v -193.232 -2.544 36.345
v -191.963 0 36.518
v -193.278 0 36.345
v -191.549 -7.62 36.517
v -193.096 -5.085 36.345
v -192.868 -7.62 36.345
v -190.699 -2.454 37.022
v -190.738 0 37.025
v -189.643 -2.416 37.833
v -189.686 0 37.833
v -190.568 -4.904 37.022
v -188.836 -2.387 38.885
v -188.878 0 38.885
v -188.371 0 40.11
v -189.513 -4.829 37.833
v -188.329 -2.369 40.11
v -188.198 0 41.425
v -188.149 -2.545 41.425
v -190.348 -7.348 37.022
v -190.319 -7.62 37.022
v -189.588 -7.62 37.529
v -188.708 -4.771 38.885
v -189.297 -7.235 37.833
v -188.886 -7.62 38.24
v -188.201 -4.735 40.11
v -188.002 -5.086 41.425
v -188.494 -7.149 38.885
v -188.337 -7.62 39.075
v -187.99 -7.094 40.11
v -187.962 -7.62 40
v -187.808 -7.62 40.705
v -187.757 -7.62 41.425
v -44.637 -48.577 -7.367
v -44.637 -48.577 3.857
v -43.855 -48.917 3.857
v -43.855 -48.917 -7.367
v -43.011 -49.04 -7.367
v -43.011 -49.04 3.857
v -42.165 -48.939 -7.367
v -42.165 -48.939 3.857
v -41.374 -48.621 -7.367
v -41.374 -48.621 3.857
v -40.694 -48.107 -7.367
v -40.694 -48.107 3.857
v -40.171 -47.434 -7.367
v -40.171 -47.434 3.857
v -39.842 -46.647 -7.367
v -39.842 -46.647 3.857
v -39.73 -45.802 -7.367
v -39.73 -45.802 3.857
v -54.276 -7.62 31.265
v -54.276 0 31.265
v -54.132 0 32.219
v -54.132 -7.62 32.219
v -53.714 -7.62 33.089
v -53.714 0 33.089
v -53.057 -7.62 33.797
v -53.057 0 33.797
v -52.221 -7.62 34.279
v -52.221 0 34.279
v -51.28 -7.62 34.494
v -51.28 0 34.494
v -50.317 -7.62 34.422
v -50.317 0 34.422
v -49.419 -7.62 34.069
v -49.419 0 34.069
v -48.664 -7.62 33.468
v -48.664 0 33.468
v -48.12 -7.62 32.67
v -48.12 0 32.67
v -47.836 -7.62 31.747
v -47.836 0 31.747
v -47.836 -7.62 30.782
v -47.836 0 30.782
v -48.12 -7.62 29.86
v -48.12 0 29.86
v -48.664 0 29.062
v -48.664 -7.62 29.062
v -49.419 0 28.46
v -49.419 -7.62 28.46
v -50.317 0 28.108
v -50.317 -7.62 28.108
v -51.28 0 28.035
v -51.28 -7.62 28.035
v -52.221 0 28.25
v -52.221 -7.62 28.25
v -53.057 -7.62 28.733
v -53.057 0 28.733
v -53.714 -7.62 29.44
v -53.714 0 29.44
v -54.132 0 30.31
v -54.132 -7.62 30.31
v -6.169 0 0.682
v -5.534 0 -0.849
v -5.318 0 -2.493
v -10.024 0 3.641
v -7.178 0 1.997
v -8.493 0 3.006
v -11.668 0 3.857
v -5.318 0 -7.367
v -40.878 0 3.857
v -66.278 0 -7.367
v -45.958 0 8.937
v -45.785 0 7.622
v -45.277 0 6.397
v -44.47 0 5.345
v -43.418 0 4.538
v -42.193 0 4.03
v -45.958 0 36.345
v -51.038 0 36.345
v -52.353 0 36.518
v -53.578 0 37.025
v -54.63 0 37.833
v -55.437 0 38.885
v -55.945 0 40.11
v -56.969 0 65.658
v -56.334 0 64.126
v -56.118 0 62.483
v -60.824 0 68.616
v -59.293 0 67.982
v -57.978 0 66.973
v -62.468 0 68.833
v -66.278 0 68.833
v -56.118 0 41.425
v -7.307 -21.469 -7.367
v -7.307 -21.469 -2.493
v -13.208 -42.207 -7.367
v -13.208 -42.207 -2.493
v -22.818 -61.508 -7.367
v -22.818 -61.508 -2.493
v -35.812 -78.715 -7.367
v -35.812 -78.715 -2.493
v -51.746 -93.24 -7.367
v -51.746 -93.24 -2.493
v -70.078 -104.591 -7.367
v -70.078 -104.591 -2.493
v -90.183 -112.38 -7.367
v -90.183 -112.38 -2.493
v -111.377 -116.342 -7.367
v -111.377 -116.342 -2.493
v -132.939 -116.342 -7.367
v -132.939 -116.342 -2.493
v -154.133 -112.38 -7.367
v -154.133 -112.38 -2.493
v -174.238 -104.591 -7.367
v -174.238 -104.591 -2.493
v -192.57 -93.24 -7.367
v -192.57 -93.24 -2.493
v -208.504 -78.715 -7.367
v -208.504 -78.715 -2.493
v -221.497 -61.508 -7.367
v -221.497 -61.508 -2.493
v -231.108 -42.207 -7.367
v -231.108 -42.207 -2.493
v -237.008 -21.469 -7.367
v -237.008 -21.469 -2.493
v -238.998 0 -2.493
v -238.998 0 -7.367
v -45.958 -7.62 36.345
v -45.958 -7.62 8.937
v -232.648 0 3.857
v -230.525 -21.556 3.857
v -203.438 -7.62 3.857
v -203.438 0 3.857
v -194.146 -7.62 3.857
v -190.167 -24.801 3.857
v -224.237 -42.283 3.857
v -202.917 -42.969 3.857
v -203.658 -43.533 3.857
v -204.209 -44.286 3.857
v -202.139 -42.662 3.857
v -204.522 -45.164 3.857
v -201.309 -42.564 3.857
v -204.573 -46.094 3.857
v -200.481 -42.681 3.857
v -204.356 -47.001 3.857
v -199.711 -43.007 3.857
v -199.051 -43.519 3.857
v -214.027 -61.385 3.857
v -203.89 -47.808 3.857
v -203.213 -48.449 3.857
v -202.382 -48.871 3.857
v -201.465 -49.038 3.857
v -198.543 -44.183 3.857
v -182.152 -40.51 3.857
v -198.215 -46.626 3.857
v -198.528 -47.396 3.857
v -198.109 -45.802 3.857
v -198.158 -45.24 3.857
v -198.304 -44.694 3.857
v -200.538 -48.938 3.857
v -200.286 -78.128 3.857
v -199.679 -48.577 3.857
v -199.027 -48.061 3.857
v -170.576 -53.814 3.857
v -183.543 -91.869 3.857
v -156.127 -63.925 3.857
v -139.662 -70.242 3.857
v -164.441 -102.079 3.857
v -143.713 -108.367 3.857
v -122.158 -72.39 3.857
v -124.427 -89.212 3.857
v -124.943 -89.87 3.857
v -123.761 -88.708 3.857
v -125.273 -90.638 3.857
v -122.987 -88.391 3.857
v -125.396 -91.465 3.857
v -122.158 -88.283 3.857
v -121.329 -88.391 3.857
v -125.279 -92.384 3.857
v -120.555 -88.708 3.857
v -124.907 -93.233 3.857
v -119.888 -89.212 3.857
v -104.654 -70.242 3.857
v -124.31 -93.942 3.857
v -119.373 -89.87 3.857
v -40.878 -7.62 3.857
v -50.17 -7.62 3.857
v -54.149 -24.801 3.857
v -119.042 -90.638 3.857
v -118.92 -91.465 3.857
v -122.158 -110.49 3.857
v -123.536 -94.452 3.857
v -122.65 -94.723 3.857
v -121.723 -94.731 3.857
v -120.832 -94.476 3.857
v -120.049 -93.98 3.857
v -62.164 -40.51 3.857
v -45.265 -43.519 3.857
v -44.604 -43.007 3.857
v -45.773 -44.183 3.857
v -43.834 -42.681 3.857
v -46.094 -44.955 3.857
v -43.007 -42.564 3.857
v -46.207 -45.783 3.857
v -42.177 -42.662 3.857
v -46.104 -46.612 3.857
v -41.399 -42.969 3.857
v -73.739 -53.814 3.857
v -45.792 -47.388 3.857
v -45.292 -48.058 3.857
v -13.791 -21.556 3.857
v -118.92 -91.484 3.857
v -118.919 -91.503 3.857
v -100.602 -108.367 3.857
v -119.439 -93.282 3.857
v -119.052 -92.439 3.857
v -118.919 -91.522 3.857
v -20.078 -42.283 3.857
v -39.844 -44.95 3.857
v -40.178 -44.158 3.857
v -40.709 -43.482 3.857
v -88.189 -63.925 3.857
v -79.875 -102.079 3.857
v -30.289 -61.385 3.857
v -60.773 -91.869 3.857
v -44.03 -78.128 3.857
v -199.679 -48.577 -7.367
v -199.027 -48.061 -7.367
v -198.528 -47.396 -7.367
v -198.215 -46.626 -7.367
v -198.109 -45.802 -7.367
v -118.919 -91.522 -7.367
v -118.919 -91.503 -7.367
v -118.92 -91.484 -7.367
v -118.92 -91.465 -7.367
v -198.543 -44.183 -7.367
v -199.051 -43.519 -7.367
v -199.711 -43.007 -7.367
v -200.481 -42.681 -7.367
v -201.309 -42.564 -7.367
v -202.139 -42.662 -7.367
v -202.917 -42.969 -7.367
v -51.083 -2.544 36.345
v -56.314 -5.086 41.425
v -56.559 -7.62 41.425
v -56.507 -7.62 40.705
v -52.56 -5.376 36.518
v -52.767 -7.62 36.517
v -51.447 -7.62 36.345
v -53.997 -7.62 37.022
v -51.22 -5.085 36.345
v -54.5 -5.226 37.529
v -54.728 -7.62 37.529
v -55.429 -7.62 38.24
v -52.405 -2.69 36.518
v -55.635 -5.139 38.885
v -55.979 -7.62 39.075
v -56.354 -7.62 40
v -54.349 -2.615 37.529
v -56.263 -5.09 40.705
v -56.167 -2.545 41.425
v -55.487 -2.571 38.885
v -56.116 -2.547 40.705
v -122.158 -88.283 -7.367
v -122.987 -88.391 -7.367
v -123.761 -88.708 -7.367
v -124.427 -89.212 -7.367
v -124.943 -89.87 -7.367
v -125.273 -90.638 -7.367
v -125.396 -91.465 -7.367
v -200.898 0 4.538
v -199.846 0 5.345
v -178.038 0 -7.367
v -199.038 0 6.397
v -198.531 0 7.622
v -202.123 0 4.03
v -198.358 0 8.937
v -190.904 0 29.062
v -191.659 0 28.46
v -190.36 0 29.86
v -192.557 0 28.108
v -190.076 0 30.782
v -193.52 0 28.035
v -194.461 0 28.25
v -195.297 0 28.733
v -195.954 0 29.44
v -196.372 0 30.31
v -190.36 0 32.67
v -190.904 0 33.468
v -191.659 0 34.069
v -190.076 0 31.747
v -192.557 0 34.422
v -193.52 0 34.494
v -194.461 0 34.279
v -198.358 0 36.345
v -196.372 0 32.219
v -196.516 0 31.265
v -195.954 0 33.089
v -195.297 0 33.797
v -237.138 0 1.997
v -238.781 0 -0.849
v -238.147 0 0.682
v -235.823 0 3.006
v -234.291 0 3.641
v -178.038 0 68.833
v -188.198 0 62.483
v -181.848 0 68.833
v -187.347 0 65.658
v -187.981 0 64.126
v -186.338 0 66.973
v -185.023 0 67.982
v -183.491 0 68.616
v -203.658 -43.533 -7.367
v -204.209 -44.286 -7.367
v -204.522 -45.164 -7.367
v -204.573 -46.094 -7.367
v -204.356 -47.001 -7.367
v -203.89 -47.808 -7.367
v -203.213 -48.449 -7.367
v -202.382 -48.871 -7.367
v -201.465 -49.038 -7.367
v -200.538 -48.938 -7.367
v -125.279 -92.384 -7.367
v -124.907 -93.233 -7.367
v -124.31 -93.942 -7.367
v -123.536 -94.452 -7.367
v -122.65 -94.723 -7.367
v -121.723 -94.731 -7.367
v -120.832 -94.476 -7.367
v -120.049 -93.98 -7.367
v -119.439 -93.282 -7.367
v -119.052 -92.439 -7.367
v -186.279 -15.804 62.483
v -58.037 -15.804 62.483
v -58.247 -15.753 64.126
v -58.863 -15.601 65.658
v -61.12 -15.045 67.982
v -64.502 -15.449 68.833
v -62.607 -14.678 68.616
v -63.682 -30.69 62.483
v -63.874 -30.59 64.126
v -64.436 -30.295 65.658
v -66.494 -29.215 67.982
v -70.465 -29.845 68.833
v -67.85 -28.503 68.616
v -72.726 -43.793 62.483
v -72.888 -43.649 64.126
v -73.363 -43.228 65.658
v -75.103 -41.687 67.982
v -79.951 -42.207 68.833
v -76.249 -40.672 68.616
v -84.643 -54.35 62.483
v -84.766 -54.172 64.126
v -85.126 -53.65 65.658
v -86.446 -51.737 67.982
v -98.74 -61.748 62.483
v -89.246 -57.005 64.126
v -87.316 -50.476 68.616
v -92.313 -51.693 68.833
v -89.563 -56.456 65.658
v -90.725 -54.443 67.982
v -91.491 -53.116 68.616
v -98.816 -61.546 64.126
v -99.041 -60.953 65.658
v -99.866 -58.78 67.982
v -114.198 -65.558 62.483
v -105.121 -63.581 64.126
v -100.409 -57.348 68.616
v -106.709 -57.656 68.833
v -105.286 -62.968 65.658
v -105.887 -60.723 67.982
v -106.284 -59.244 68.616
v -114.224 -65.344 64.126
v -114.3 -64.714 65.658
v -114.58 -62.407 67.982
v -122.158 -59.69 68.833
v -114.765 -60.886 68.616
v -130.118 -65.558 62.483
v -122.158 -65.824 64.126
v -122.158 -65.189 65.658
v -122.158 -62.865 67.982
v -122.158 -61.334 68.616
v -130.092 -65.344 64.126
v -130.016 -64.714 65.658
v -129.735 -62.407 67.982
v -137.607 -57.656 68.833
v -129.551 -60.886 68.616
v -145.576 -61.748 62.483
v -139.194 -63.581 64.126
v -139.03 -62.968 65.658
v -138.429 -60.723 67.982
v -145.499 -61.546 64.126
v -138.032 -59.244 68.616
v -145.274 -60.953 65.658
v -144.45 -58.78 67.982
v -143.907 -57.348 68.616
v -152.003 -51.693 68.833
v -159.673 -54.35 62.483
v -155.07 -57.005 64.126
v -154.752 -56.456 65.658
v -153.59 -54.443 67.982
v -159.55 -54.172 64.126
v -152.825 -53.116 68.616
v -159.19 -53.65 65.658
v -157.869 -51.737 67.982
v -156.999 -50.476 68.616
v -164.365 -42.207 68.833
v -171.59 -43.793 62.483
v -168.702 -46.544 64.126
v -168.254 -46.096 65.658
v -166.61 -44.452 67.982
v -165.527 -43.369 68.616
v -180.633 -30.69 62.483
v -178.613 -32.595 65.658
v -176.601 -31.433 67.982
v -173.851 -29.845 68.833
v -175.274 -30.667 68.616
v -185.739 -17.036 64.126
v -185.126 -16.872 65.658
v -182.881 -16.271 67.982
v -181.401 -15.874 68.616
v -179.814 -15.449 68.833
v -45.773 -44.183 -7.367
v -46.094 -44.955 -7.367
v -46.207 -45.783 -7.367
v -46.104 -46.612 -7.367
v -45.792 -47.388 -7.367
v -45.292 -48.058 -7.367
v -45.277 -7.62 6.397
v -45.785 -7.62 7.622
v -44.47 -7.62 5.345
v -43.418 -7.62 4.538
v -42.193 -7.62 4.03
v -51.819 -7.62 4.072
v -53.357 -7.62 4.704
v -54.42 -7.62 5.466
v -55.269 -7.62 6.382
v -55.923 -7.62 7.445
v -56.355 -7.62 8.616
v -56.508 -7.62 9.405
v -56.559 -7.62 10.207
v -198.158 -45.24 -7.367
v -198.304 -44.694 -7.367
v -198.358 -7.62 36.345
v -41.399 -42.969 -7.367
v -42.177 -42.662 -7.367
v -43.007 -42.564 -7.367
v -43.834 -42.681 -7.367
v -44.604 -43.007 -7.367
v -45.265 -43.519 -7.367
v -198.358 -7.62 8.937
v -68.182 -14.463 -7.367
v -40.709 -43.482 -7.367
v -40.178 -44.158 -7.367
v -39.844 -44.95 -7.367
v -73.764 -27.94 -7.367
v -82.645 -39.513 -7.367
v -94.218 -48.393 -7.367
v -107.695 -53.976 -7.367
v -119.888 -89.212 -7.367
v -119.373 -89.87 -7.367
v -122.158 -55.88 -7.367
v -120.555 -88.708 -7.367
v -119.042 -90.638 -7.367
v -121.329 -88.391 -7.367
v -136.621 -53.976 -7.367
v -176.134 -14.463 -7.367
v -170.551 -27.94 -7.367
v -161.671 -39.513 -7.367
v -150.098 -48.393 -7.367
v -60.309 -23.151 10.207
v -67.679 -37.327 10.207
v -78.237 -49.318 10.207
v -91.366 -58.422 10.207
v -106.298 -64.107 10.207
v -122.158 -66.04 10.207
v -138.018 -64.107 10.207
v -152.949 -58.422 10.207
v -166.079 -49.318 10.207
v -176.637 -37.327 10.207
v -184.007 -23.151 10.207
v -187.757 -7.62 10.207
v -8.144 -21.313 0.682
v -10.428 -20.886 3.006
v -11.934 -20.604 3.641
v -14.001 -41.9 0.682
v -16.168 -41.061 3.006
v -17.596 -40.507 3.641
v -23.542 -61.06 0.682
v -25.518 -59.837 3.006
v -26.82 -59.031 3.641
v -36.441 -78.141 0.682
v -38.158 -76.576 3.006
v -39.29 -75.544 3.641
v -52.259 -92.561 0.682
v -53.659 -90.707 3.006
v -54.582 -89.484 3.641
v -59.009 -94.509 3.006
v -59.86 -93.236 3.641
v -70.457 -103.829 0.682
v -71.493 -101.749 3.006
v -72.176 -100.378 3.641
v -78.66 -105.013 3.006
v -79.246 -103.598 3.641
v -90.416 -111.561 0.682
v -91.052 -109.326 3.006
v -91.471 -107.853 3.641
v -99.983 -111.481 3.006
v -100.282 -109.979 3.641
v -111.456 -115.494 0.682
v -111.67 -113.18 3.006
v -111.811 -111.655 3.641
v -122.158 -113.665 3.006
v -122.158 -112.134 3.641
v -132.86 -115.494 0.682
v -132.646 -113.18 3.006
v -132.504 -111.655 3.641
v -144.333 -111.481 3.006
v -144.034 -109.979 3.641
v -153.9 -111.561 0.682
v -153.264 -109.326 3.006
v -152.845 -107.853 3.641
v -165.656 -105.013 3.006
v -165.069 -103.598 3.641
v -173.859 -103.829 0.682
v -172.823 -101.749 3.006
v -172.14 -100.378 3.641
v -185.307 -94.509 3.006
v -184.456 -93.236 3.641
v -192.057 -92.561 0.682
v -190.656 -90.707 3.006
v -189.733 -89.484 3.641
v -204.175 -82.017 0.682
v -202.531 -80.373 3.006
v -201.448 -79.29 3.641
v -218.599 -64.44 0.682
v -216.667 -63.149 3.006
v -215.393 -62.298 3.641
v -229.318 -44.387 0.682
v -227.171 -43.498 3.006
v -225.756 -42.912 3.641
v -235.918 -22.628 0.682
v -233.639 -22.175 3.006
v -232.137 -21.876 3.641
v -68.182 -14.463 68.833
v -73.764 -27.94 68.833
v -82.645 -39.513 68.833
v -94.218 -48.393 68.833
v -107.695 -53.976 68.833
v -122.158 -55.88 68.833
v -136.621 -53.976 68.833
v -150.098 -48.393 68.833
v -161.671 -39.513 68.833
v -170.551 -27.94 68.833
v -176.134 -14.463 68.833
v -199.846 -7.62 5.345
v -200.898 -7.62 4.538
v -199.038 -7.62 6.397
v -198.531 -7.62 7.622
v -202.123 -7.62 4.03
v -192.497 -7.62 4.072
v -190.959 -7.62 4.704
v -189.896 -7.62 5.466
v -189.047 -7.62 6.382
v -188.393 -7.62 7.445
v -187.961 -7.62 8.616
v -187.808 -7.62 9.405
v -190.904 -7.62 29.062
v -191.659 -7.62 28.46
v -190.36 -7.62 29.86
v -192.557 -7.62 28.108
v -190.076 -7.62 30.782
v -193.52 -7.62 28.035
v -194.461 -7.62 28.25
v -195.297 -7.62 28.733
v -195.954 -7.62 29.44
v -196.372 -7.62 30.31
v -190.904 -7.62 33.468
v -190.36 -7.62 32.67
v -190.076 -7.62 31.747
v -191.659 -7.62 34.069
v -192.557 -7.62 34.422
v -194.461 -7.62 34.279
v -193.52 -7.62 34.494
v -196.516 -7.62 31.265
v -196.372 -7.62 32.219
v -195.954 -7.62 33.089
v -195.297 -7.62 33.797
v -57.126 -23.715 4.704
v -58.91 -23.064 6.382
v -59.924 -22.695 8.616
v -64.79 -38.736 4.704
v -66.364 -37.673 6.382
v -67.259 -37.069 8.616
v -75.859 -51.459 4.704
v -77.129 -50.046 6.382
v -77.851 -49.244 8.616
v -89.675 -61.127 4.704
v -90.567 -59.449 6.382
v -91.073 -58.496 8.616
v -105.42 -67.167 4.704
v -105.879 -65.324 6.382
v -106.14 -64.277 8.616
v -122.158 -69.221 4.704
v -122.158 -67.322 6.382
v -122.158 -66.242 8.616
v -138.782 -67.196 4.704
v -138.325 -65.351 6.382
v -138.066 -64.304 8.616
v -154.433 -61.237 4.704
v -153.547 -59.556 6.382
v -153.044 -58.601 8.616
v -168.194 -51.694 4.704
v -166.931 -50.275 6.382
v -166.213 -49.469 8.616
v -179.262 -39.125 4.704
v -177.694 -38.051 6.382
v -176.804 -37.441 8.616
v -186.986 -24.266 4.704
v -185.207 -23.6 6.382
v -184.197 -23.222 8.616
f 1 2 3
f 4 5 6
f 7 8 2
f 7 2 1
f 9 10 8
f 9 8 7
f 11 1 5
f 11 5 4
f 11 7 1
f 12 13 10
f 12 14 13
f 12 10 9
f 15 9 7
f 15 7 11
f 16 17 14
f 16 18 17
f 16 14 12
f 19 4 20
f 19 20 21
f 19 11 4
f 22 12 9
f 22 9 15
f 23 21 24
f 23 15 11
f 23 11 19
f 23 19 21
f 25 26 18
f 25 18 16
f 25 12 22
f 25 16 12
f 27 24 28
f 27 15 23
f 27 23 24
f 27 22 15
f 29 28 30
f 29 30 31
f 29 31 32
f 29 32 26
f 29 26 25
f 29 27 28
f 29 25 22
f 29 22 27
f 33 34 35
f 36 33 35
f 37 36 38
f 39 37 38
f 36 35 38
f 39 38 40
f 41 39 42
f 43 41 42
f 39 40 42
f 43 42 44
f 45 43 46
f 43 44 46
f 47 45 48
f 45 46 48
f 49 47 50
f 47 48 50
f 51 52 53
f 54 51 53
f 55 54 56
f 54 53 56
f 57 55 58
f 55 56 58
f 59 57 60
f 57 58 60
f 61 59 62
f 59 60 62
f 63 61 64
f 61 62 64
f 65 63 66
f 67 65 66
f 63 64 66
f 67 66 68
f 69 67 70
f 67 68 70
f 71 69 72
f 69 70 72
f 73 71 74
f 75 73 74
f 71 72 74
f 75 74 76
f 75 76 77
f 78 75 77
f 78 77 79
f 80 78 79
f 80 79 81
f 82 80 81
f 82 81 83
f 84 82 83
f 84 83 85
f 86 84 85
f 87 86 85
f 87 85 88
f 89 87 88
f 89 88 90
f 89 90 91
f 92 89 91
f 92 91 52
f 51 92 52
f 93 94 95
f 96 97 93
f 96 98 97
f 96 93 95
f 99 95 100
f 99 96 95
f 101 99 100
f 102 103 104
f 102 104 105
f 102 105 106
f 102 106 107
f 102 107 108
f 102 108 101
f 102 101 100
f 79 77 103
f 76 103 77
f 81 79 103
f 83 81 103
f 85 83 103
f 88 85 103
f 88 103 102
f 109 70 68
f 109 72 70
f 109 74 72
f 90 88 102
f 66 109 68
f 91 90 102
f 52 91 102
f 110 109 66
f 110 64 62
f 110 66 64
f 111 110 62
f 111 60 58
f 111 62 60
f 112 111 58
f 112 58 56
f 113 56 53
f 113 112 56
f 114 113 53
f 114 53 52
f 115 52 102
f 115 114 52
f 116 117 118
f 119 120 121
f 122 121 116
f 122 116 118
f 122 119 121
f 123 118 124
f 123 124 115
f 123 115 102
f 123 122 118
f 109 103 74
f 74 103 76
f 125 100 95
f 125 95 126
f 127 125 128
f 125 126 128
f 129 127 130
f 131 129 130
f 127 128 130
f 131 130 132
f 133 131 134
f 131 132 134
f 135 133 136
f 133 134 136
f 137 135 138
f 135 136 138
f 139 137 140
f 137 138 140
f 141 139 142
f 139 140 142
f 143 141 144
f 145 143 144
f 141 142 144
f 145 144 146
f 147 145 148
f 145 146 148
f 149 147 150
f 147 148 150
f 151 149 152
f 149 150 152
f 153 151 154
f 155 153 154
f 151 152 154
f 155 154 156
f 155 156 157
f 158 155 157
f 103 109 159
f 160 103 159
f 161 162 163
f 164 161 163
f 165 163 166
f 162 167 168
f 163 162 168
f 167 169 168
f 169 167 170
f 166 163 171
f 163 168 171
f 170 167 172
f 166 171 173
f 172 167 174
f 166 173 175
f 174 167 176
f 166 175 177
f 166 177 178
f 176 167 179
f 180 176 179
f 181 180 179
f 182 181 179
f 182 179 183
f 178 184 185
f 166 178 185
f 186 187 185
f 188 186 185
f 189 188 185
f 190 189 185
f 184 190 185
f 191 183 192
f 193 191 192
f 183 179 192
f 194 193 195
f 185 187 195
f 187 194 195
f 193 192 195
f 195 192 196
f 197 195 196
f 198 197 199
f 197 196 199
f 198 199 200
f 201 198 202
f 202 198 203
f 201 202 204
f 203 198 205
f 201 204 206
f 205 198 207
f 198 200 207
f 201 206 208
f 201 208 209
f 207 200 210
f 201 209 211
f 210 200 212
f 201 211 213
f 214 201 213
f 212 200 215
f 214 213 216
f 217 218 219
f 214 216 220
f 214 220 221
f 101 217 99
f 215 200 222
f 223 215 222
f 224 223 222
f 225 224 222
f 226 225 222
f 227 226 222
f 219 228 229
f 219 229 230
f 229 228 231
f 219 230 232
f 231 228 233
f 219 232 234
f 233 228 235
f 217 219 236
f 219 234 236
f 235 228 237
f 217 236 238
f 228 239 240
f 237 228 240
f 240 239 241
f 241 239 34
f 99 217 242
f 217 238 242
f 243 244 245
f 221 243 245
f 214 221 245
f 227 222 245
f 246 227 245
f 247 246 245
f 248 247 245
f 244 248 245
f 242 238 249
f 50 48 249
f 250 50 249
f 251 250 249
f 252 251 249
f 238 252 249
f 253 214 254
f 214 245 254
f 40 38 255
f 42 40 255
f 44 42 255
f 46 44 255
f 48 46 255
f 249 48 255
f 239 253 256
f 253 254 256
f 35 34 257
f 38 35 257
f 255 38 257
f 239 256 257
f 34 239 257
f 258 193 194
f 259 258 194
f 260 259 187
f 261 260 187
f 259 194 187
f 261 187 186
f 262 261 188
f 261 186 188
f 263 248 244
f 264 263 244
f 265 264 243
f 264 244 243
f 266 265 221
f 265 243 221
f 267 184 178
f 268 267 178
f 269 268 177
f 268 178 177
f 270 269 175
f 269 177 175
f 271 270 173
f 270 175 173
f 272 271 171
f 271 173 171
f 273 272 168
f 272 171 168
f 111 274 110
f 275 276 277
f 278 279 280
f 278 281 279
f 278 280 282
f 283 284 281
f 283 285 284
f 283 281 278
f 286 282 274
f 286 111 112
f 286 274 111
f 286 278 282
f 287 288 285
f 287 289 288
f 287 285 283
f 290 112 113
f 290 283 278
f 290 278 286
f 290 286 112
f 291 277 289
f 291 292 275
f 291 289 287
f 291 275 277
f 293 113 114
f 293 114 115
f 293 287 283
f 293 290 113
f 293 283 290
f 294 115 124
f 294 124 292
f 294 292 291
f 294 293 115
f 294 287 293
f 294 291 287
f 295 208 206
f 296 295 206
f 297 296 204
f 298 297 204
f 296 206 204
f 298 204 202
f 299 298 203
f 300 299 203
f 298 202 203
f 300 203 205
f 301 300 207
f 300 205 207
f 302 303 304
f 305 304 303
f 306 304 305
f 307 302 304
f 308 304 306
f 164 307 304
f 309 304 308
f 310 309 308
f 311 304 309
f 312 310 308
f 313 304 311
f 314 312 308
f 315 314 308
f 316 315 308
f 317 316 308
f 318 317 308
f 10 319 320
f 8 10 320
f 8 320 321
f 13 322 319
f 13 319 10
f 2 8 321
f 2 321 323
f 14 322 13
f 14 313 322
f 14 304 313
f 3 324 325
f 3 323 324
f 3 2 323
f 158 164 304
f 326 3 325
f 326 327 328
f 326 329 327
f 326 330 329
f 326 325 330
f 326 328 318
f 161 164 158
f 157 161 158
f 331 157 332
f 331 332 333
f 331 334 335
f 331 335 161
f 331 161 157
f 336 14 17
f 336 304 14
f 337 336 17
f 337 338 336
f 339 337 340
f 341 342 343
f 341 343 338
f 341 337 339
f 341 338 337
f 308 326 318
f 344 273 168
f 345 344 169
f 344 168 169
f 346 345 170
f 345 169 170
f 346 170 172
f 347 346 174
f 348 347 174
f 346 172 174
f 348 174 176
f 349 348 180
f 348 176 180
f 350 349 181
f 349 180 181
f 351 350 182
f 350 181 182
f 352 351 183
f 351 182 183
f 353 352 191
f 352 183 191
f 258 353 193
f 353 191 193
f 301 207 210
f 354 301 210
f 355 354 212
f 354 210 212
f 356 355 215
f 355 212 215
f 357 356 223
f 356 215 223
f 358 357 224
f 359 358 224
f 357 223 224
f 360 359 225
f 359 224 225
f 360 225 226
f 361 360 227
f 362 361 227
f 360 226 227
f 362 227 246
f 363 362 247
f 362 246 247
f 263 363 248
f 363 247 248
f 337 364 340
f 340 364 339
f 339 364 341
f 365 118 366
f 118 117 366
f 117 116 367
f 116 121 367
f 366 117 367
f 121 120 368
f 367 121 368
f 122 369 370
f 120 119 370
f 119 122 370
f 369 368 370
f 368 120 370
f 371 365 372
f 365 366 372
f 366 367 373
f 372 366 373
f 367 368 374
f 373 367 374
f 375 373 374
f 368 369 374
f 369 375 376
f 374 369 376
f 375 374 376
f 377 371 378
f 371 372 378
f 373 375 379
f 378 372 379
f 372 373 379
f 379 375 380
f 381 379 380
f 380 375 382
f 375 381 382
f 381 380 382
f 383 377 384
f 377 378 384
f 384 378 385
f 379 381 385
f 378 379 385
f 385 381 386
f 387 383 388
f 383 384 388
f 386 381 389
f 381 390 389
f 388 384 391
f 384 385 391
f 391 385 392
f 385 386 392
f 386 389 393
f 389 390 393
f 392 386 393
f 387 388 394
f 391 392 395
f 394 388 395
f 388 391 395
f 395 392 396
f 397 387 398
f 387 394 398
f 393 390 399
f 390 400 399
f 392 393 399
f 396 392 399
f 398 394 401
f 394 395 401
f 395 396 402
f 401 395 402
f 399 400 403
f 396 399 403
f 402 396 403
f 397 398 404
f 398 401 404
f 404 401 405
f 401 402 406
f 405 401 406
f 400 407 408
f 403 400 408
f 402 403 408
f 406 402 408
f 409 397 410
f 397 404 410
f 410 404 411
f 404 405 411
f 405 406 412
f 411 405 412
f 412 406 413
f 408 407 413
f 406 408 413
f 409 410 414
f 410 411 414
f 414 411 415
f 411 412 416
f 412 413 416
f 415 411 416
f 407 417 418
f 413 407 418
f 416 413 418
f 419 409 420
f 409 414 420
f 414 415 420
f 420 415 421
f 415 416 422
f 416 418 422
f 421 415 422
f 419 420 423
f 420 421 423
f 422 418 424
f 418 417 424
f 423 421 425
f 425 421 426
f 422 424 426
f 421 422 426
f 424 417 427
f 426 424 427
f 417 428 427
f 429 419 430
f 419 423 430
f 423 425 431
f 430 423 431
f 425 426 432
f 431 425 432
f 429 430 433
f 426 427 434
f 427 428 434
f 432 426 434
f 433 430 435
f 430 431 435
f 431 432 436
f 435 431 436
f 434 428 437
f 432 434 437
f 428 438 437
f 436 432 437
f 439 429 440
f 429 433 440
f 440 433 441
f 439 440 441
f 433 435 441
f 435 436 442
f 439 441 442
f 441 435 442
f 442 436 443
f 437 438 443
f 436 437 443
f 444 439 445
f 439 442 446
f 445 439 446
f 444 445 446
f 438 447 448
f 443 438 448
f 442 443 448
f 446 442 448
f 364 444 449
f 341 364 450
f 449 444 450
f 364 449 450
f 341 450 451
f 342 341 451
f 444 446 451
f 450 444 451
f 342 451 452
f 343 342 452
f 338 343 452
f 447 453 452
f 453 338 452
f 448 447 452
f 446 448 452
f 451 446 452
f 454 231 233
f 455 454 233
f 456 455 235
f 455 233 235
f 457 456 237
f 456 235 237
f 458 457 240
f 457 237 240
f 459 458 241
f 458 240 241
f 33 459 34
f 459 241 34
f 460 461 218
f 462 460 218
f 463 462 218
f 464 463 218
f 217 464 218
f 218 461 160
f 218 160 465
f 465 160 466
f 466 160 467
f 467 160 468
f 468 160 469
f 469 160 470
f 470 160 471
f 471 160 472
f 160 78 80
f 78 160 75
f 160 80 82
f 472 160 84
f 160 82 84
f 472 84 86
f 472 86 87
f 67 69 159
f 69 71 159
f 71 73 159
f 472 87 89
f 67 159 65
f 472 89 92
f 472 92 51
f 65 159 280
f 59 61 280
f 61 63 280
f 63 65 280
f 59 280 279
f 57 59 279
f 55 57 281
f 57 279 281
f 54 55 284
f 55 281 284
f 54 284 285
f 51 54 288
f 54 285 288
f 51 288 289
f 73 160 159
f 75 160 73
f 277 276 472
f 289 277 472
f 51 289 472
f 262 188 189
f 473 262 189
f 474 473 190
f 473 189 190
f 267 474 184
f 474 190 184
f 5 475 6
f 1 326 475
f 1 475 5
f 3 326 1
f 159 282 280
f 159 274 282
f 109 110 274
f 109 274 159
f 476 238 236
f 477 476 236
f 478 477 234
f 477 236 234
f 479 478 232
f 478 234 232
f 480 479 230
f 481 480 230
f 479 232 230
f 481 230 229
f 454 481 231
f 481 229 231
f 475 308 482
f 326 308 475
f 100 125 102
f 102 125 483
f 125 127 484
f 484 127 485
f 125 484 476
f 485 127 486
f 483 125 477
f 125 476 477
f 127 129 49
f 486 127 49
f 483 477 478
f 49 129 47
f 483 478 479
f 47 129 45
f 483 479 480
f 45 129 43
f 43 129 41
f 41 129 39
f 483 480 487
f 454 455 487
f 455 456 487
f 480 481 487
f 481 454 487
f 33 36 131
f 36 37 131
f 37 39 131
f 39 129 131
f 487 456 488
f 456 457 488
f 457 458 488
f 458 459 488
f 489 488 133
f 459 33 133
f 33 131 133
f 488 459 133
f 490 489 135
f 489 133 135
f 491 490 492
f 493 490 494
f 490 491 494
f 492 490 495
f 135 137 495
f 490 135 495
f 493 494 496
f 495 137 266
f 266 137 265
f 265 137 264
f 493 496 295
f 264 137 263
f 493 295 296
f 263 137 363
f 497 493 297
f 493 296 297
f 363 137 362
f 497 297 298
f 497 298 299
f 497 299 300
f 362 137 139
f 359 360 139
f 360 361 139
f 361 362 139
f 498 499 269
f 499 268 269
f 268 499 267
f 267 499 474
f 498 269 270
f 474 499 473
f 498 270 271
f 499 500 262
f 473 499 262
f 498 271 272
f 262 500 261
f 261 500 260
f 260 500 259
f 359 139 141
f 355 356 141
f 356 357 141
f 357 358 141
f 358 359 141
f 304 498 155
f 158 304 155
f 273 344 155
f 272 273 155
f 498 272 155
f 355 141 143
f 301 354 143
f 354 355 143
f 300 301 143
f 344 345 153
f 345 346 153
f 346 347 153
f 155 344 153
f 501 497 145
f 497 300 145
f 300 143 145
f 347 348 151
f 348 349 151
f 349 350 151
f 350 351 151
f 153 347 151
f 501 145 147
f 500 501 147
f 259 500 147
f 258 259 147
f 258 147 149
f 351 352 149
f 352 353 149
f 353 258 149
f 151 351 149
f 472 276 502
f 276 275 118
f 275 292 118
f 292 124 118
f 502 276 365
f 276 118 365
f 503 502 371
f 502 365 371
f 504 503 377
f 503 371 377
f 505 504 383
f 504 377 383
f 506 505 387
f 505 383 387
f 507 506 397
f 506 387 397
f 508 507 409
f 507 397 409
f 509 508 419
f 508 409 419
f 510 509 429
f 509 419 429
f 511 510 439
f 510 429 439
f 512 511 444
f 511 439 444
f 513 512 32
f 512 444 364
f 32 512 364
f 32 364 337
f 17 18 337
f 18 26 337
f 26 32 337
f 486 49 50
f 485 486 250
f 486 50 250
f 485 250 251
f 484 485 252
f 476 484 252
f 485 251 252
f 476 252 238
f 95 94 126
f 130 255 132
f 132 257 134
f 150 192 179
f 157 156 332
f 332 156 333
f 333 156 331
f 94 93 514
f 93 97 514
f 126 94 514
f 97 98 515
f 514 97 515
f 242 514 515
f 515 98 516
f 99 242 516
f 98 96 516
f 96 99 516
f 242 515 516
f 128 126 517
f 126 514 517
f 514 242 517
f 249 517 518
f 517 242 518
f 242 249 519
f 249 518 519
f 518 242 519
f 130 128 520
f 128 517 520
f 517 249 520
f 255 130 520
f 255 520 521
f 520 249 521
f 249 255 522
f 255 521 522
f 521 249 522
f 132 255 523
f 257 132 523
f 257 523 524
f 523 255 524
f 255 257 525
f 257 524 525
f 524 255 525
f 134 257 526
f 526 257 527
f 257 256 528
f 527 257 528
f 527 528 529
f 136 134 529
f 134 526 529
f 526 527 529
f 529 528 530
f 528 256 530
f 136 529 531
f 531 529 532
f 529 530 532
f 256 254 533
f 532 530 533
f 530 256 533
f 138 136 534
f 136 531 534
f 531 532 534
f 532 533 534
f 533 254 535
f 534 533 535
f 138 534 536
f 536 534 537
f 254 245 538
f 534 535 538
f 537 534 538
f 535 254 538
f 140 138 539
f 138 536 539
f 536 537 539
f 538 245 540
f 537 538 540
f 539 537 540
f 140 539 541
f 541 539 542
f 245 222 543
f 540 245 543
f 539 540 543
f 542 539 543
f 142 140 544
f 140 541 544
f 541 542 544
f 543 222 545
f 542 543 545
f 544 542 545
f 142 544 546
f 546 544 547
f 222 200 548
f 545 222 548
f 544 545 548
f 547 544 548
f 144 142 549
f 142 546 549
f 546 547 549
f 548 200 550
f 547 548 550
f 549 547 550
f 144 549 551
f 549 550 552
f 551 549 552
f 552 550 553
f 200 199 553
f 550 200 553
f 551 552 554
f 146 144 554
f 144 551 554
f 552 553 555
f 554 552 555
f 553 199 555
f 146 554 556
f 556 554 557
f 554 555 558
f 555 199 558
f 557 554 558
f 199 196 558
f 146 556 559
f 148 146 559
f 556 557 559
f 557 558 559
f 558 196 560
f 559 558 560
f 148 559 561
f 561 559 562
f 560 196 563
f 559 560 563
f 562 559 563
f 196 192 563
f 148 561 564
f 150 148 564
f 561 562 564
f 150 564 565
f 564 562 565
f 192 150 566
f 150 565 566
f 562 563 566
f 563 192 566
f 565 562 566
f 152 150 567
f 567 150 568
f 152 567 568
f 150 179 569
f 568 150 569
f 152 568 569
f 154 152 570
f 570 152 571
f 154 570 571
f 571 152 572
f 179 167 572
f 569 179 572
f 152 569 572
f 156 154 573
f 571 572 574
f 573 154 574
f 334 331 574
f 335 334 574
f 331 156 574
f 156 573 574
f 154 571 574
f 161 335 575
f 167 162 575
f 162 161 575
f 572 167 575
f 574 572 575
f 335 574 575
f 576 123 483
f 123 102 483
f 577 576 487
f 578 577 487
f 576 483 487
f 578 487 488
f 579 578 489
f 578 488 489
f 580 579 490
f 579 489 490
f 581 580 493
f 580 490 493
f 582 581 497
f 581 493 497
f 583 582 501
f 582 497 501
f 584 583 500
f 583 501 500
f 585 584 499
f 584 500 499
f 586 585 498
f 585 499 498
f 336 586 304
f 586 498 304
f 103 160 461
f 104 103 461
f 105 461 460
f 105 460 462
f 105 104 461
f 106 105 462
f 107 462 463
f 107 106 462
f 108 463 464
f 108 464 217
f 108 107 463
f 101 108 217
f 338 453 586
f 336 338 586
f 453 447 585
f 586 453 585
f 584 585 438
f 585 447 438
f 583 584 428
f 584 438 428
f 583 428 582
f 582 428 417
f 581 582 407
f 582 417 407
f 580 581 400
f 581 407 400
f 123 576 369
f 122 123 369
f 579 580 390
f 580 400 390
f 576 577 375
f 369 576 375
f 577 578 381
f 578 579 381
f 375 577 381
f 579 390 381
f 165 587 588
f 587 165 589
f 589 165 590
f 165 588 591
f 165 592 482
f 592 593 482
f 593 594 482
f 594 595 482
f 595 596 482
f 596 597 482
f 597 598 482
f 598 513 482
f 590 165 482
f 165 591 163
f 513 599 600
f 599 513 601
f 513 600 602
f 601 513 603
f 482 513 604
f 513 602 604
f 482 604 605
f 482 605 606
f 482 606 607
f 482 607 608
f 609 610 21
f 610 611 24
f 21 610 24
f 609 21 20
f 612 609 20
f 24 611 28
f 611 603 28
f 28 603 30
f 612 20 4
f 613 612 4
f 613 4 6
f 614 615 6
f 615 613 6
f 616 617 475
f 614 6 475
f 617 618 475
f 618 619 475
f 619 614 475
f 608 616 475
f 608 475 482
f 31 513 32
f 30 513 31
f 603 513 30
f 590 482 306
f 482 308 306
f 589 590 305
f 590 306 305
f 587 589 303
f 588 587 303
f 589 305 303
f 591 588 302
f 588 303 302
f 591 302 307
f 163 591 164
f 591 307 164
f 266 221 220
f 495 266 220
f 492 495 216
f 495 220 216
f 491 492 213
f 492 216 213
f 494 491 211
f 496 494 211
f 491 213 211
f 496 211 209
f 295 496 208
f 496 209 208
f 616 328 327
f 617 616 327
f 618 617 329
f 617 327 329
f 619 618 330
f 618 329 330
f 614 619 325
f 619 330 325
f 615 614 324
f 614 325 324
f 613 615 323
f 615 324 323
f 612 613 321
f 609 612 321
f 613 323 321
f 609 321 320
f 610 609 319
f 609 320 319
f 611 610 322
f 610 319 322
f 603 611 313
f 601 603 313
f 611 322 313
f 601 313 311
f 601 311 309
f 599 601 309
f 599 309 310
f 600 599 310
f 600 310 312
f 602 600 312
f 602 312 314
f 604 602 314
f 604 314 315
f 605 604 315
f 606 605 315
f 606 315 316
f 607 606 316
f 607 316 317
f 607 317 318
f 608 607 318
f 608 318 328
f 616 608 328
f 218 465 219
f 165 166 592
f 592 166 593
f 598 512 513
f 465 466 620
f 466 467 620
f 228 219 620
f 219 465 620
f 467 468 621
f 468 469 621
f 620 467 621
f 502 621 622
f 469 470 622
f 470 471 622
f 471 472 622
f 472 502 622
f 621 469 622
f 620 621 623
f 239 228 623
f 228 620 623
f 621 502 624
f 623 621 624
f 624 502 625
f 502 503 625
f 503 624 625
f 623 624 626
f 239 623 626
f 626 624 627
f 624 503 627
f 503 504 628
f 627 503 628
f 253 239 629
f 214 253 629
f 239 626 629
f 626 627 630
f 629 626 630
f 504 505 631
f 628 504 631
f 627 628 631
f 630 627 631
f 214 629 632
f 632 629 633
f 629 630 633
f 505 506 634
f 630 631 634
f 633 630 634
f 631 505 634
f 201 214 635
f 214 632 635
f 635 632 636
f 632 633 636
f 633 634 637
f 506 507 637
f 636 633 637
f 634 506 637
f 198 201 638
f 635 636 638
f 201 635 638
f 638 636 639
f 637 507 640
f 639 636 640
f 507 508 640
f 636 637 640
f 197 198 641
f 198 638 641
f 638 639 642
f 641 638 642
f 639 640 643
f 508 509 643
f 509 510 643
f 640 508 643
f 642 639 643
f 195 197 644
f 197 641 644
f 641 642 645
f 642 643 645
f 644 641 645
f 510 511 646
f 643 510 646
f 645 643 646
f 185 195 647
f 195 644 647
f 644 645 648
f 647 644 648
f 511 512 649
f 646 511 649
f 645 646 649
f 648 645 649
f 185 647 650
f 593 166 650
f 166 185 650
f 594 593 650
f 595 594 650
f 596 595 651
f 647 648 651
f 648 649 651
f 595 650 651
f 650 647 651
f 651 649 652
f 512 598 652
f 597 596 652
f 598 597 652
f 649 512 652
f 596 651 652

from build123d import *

# Parameters (mm, degrees)
F1_ANGLE  = 180
F2_W      = 10.16
F2_H      = 10.16
F3_DEPTH  = 7.62
F4_R      = 3.2385
F5_DEPTH  = 25.4
F6_W      = 10.16
F6_H      = 10.16
F7_DEPTH  = 7.62
F8_R      = 3.2385
F9_DEPTH  = 25.4
F11_DEPTH = 25.4
F12_DEPTH = 25.4
F13_DEPTH = 25.4
F14_R     = 5.08


with BuildPart() as f1:
    # F0 (on Front) → F1 (revolve)
    with BuildSketch(Plane.XZ):
        with BuildLine():
            Line((-62.4678657544, 68.8326101213), (-66.2778657544, 68.8326101213))
            Line((-66.2778657544, 68.8326101213), (-66.2778657544, -7.3673898787))
            Line((-66.2778657544, -7.3673898787), (-56.3942688751, -7.3673898787))
            Line((-56.3942688751, -7.3673898787), (-5.3178657544, -7.3673898787))
            Line((-5.3178657544, -7.3673898787), (-5.3178657544, -2.4929920513))
            ThreePointArc((-5.3178657544, -2.4929920513), (-7.1777376938, 1.9971360092), (-11.6678657544, 3.8570079487))
            Line((-11.6678657544, 3.8570079487), (-49.7678657544, 3.8570079487))
            ThreePointArc((-49.7678657544, 3.8570079487), (-54.2579938149, 5.7168798881), (-56.1178657544, 10.2070079487))
            Line((-56.1178657544, 10.2070079487), (-56.1178657544, 62.4826101213))
            ThreePointArc((-56.1178657544, 62.4826101213), (-57.9777376938, 66.9727381818), (-62.4678657544, 68.8326101213))
        make_face()
    revolve(axis=Axis((-122.1578657544, 0, 30.7326101213), (0, 0, -1)), revolution_arc=F1_ANGLE)

    # F2 (on face) → F3 (join)
    with BuildSketch(Plane(origin=(0, 0, 0), x_dir=(-1, 0, 0), z_dir=(0, 1, 0))):
        with Locations((61.1978657544, 31.264809035)):
            Rectangle(F2_W, F2_H)
        with Locations((51.0378657544, 31.264809035)):
            Rectangle(F2_W, F2_H)
    extrude(amount=-F3_DEPTH)

    # F4 (on face) → F5 (cut)
    with BuildSketch(Plane(origin=(0, 0, 0), x_dir=(-1, 0, 0), z_dir=(0, 1, 0))):
        with Locations((51.0378657544, 31.264809035)):
            Circle(F4_R)
    extrude(amount=-F5_DEPTH, mode=Mode.SUBTRACT)

    # F6 (on face) → F7 (join)
    with BuildSketch(Plane(origin=(0, 0, 0), x_dir=(-1, 0, 0), z_dir=(0, 1, 0))):
        with Locations((183.1178657544, 31.264809035)):
            Rectangle(F6_W, F6_H)
        with Locations((193.2778657544, 31.264809035)):
            Rectangle(F6_W, F6_H)
    extrude(amount=-F7_DEPTH)

    # F8 (on face) → F9 (cut)
    with BuildSketch(Plane(origin=(0, 0, 0), x_dir=(-1, 0, 0), z_dir=(0, 1, 0))):
        with Locations((193.2778657544, 31.264809035)):
            Circle(F8_R)
    extrude(amount=-F9_DEPTH, mode=Mode.SUBTRACT)

    # F10 (on face) → F11 (cut)
    with BuildSketch(Plane.XY.offset(3.8570079487)):
        with BuildLine():
            ThreePointArc((-201.347260479, -45.8019683397), (-202.1444682095, -44.3924875908), (-202.9165913892, -42.9691106405))
            ThreePointArc((-202.9165913892, -42.9691106405), (-204.1518837491, -47.4212183397), (-199.6785992012, -48.5774776245))
            ThreePointArc((-199.6785992012, -48.5774776245), (-200.5252182095, -47.1971108609), (-201.347260479, -45.8019683397))
        make_face()
        with BuildLine():
            ThreePointArc((-198.5426372088, -44.1827183397), (-200.4814096168, -42.6813619028), (-202.9165913892, -42.9691106405))
            ThreePointArc((-202.9165913892, -42.9691106405), (-202.1444682095, -44.3924875908), (-201.347260479, -45.8019683397))
            Line((-201.347260479, -45.8019683397), (-198.5426372088, -44.1827183397))
        make_face()
        with BuildLine():
            Line((-198.5426372088, -44.1827183397), (-201.347260479, -45.8019683397))
            ThreePointArc((-201.347260479, -45.8019683397), (-200.5252182095, -47.1971108609), (-199.6785992012, -48.5774776245))
            ThreePointArc((-199.6785992012, -48.5774776245), (-198.5284094898, -47.3963212966), (-198.108760479, -45.8019683397))
            ThreePointArc((-198.108760479, -45.8019683397), (-198.2191096905, -44.9637828622), (-198.5426372088, -44.1827183397))
        make_face()
        with BuildLine():
            ThreePointArc((-122.1578657544, -91.521986701), (-123.7771157544, -91.5076484732), (-125.3958579423, -91.4646382865))
            ThreePointArc((-125.3958579423, -91.4646382865), (-122.1865410857, -94.7603597455), (-118.9193657544, -91.521986701))
            ThreePointArc((-118.9193657544, -91.521986701), (-118.9194927099, -91.4933113696), (-118.9198735664, -91.4646382865))
            ThreePointArc((-118.9198735664, -91.4646382865), (-120.5386157544, -91.5076484732), (-122.1578657544, -91.521986701))
        make_face()
        with BuildLine():
            ThreePointArc((-122.1578657544, -88.283486701), (-124.4274647729, -89.2118346399), (-125.3958579423, -91.4646382865))
            ThreePointArc((-125.3958579423, -91.4646382865), (-123.7771157544, -91.5076484732), (-122.1578657544, -91.521986701))
            Line((-122.1578657544, -91.521986701), (-122.1578657544, -88.283486701))
        make_face()
        with BuildLine():
            ThreePointArc((-118.9198735664, -91.4646382865), (-119.8882667358, -89.2118346399), (-122.1578657544, -88.283486701))
            Line((-122.1578657544, -88.283486701), (-122.1578657544, -91.521986701))
            ThreePointArc((-122.1578657544, -91.521986701), (-120.5386157544, -91.5076484732), (-118.9198735664, -91.4646382865))
        make_face()
        with BuildLine():
            ThreePointArc((-39.7299710298, -45.8019683397), (-40.178295372, -44.1579482521), (-41.3991401196, -42.9691106405))
            ThreePointArc((-41.3991401196, -42.9691106405), (-42.1712632993, -44.3924875908), (-42.9684710298, -45.8019683397))
            ThreePointArc((-42.9684710298, -45.8019683397), (-43.7905132993, -47.1971108609), (-44.6371323075, -48.5774776245))
            ThreePointArc((-44.6371323075, -48.5774776245), (-41.3741180729, -48.6208193289), (-39.7299710298, -45.8019683397))
        make_face()
        with BuildLine():
            Line((-42.9684710298, -45.8019683397), (-45.7730942999, -44.1827183397))
            ThreePointArc((-45.7730942999, -44.1827183397), (-46.1039209105, -46.6124227157), (-44.6371323075, -48.5774776245))
            ThreePointArc((-44.6371323075, -48.5774776245), (-43.7905132993, -47.1971108609), (-42.9684710298, -45.8019683397))
        make_face()
        with BuildLine():
            ThreePointArc((-42.9684710298, -45.8019683397), (-42.1712632993, -44.3924875908), (-41.3991401196, -42.9691106405))
            ThreePointArc((-41.3991401196, -42.9691106405), (-43.834321892, -42.6813619028), (-45.7730942999, -44.1827183397))
            Line((-45.7730942999, -44.1827183397), (-42.9684710298, -45.8019683397))
        make_face()
    extrude(amount=-F11_DEPTH, mode=Mode.SUBTRACT)

    # F12 (add): a face of the model
    f12_faces = [f1.faces().sort_by_distance(p)[0] for p in [
        (-193.2036113422, -3.8371570424, 26.184809035),
    ]]
    extrude(f12_faces, amount=F12_DEPTH)

    # F13 (add): a face of the model
    f13_faces = [f1.faces().sort_by_distance(p)[0] for p in [
        (-51.1121201665, -3.8371570424, 26.184809035),
    ]]
    extrude(f13_faces, amount=F13_DEPTH)

    # F14
    f14_edges = [f1.edges().sort_by_distance(p)[0] for p in [
        (-198.357866, -3.81, 3.857008),
        (-188.087501, -3.816378, 36.344809),
        (-45.957866, -3.81, 3.857008),
        (-56.22823, -3.816378, 36.344809),
    ]]
    fillet(f14_edges, radius=F14_R)


solid = f1.part
